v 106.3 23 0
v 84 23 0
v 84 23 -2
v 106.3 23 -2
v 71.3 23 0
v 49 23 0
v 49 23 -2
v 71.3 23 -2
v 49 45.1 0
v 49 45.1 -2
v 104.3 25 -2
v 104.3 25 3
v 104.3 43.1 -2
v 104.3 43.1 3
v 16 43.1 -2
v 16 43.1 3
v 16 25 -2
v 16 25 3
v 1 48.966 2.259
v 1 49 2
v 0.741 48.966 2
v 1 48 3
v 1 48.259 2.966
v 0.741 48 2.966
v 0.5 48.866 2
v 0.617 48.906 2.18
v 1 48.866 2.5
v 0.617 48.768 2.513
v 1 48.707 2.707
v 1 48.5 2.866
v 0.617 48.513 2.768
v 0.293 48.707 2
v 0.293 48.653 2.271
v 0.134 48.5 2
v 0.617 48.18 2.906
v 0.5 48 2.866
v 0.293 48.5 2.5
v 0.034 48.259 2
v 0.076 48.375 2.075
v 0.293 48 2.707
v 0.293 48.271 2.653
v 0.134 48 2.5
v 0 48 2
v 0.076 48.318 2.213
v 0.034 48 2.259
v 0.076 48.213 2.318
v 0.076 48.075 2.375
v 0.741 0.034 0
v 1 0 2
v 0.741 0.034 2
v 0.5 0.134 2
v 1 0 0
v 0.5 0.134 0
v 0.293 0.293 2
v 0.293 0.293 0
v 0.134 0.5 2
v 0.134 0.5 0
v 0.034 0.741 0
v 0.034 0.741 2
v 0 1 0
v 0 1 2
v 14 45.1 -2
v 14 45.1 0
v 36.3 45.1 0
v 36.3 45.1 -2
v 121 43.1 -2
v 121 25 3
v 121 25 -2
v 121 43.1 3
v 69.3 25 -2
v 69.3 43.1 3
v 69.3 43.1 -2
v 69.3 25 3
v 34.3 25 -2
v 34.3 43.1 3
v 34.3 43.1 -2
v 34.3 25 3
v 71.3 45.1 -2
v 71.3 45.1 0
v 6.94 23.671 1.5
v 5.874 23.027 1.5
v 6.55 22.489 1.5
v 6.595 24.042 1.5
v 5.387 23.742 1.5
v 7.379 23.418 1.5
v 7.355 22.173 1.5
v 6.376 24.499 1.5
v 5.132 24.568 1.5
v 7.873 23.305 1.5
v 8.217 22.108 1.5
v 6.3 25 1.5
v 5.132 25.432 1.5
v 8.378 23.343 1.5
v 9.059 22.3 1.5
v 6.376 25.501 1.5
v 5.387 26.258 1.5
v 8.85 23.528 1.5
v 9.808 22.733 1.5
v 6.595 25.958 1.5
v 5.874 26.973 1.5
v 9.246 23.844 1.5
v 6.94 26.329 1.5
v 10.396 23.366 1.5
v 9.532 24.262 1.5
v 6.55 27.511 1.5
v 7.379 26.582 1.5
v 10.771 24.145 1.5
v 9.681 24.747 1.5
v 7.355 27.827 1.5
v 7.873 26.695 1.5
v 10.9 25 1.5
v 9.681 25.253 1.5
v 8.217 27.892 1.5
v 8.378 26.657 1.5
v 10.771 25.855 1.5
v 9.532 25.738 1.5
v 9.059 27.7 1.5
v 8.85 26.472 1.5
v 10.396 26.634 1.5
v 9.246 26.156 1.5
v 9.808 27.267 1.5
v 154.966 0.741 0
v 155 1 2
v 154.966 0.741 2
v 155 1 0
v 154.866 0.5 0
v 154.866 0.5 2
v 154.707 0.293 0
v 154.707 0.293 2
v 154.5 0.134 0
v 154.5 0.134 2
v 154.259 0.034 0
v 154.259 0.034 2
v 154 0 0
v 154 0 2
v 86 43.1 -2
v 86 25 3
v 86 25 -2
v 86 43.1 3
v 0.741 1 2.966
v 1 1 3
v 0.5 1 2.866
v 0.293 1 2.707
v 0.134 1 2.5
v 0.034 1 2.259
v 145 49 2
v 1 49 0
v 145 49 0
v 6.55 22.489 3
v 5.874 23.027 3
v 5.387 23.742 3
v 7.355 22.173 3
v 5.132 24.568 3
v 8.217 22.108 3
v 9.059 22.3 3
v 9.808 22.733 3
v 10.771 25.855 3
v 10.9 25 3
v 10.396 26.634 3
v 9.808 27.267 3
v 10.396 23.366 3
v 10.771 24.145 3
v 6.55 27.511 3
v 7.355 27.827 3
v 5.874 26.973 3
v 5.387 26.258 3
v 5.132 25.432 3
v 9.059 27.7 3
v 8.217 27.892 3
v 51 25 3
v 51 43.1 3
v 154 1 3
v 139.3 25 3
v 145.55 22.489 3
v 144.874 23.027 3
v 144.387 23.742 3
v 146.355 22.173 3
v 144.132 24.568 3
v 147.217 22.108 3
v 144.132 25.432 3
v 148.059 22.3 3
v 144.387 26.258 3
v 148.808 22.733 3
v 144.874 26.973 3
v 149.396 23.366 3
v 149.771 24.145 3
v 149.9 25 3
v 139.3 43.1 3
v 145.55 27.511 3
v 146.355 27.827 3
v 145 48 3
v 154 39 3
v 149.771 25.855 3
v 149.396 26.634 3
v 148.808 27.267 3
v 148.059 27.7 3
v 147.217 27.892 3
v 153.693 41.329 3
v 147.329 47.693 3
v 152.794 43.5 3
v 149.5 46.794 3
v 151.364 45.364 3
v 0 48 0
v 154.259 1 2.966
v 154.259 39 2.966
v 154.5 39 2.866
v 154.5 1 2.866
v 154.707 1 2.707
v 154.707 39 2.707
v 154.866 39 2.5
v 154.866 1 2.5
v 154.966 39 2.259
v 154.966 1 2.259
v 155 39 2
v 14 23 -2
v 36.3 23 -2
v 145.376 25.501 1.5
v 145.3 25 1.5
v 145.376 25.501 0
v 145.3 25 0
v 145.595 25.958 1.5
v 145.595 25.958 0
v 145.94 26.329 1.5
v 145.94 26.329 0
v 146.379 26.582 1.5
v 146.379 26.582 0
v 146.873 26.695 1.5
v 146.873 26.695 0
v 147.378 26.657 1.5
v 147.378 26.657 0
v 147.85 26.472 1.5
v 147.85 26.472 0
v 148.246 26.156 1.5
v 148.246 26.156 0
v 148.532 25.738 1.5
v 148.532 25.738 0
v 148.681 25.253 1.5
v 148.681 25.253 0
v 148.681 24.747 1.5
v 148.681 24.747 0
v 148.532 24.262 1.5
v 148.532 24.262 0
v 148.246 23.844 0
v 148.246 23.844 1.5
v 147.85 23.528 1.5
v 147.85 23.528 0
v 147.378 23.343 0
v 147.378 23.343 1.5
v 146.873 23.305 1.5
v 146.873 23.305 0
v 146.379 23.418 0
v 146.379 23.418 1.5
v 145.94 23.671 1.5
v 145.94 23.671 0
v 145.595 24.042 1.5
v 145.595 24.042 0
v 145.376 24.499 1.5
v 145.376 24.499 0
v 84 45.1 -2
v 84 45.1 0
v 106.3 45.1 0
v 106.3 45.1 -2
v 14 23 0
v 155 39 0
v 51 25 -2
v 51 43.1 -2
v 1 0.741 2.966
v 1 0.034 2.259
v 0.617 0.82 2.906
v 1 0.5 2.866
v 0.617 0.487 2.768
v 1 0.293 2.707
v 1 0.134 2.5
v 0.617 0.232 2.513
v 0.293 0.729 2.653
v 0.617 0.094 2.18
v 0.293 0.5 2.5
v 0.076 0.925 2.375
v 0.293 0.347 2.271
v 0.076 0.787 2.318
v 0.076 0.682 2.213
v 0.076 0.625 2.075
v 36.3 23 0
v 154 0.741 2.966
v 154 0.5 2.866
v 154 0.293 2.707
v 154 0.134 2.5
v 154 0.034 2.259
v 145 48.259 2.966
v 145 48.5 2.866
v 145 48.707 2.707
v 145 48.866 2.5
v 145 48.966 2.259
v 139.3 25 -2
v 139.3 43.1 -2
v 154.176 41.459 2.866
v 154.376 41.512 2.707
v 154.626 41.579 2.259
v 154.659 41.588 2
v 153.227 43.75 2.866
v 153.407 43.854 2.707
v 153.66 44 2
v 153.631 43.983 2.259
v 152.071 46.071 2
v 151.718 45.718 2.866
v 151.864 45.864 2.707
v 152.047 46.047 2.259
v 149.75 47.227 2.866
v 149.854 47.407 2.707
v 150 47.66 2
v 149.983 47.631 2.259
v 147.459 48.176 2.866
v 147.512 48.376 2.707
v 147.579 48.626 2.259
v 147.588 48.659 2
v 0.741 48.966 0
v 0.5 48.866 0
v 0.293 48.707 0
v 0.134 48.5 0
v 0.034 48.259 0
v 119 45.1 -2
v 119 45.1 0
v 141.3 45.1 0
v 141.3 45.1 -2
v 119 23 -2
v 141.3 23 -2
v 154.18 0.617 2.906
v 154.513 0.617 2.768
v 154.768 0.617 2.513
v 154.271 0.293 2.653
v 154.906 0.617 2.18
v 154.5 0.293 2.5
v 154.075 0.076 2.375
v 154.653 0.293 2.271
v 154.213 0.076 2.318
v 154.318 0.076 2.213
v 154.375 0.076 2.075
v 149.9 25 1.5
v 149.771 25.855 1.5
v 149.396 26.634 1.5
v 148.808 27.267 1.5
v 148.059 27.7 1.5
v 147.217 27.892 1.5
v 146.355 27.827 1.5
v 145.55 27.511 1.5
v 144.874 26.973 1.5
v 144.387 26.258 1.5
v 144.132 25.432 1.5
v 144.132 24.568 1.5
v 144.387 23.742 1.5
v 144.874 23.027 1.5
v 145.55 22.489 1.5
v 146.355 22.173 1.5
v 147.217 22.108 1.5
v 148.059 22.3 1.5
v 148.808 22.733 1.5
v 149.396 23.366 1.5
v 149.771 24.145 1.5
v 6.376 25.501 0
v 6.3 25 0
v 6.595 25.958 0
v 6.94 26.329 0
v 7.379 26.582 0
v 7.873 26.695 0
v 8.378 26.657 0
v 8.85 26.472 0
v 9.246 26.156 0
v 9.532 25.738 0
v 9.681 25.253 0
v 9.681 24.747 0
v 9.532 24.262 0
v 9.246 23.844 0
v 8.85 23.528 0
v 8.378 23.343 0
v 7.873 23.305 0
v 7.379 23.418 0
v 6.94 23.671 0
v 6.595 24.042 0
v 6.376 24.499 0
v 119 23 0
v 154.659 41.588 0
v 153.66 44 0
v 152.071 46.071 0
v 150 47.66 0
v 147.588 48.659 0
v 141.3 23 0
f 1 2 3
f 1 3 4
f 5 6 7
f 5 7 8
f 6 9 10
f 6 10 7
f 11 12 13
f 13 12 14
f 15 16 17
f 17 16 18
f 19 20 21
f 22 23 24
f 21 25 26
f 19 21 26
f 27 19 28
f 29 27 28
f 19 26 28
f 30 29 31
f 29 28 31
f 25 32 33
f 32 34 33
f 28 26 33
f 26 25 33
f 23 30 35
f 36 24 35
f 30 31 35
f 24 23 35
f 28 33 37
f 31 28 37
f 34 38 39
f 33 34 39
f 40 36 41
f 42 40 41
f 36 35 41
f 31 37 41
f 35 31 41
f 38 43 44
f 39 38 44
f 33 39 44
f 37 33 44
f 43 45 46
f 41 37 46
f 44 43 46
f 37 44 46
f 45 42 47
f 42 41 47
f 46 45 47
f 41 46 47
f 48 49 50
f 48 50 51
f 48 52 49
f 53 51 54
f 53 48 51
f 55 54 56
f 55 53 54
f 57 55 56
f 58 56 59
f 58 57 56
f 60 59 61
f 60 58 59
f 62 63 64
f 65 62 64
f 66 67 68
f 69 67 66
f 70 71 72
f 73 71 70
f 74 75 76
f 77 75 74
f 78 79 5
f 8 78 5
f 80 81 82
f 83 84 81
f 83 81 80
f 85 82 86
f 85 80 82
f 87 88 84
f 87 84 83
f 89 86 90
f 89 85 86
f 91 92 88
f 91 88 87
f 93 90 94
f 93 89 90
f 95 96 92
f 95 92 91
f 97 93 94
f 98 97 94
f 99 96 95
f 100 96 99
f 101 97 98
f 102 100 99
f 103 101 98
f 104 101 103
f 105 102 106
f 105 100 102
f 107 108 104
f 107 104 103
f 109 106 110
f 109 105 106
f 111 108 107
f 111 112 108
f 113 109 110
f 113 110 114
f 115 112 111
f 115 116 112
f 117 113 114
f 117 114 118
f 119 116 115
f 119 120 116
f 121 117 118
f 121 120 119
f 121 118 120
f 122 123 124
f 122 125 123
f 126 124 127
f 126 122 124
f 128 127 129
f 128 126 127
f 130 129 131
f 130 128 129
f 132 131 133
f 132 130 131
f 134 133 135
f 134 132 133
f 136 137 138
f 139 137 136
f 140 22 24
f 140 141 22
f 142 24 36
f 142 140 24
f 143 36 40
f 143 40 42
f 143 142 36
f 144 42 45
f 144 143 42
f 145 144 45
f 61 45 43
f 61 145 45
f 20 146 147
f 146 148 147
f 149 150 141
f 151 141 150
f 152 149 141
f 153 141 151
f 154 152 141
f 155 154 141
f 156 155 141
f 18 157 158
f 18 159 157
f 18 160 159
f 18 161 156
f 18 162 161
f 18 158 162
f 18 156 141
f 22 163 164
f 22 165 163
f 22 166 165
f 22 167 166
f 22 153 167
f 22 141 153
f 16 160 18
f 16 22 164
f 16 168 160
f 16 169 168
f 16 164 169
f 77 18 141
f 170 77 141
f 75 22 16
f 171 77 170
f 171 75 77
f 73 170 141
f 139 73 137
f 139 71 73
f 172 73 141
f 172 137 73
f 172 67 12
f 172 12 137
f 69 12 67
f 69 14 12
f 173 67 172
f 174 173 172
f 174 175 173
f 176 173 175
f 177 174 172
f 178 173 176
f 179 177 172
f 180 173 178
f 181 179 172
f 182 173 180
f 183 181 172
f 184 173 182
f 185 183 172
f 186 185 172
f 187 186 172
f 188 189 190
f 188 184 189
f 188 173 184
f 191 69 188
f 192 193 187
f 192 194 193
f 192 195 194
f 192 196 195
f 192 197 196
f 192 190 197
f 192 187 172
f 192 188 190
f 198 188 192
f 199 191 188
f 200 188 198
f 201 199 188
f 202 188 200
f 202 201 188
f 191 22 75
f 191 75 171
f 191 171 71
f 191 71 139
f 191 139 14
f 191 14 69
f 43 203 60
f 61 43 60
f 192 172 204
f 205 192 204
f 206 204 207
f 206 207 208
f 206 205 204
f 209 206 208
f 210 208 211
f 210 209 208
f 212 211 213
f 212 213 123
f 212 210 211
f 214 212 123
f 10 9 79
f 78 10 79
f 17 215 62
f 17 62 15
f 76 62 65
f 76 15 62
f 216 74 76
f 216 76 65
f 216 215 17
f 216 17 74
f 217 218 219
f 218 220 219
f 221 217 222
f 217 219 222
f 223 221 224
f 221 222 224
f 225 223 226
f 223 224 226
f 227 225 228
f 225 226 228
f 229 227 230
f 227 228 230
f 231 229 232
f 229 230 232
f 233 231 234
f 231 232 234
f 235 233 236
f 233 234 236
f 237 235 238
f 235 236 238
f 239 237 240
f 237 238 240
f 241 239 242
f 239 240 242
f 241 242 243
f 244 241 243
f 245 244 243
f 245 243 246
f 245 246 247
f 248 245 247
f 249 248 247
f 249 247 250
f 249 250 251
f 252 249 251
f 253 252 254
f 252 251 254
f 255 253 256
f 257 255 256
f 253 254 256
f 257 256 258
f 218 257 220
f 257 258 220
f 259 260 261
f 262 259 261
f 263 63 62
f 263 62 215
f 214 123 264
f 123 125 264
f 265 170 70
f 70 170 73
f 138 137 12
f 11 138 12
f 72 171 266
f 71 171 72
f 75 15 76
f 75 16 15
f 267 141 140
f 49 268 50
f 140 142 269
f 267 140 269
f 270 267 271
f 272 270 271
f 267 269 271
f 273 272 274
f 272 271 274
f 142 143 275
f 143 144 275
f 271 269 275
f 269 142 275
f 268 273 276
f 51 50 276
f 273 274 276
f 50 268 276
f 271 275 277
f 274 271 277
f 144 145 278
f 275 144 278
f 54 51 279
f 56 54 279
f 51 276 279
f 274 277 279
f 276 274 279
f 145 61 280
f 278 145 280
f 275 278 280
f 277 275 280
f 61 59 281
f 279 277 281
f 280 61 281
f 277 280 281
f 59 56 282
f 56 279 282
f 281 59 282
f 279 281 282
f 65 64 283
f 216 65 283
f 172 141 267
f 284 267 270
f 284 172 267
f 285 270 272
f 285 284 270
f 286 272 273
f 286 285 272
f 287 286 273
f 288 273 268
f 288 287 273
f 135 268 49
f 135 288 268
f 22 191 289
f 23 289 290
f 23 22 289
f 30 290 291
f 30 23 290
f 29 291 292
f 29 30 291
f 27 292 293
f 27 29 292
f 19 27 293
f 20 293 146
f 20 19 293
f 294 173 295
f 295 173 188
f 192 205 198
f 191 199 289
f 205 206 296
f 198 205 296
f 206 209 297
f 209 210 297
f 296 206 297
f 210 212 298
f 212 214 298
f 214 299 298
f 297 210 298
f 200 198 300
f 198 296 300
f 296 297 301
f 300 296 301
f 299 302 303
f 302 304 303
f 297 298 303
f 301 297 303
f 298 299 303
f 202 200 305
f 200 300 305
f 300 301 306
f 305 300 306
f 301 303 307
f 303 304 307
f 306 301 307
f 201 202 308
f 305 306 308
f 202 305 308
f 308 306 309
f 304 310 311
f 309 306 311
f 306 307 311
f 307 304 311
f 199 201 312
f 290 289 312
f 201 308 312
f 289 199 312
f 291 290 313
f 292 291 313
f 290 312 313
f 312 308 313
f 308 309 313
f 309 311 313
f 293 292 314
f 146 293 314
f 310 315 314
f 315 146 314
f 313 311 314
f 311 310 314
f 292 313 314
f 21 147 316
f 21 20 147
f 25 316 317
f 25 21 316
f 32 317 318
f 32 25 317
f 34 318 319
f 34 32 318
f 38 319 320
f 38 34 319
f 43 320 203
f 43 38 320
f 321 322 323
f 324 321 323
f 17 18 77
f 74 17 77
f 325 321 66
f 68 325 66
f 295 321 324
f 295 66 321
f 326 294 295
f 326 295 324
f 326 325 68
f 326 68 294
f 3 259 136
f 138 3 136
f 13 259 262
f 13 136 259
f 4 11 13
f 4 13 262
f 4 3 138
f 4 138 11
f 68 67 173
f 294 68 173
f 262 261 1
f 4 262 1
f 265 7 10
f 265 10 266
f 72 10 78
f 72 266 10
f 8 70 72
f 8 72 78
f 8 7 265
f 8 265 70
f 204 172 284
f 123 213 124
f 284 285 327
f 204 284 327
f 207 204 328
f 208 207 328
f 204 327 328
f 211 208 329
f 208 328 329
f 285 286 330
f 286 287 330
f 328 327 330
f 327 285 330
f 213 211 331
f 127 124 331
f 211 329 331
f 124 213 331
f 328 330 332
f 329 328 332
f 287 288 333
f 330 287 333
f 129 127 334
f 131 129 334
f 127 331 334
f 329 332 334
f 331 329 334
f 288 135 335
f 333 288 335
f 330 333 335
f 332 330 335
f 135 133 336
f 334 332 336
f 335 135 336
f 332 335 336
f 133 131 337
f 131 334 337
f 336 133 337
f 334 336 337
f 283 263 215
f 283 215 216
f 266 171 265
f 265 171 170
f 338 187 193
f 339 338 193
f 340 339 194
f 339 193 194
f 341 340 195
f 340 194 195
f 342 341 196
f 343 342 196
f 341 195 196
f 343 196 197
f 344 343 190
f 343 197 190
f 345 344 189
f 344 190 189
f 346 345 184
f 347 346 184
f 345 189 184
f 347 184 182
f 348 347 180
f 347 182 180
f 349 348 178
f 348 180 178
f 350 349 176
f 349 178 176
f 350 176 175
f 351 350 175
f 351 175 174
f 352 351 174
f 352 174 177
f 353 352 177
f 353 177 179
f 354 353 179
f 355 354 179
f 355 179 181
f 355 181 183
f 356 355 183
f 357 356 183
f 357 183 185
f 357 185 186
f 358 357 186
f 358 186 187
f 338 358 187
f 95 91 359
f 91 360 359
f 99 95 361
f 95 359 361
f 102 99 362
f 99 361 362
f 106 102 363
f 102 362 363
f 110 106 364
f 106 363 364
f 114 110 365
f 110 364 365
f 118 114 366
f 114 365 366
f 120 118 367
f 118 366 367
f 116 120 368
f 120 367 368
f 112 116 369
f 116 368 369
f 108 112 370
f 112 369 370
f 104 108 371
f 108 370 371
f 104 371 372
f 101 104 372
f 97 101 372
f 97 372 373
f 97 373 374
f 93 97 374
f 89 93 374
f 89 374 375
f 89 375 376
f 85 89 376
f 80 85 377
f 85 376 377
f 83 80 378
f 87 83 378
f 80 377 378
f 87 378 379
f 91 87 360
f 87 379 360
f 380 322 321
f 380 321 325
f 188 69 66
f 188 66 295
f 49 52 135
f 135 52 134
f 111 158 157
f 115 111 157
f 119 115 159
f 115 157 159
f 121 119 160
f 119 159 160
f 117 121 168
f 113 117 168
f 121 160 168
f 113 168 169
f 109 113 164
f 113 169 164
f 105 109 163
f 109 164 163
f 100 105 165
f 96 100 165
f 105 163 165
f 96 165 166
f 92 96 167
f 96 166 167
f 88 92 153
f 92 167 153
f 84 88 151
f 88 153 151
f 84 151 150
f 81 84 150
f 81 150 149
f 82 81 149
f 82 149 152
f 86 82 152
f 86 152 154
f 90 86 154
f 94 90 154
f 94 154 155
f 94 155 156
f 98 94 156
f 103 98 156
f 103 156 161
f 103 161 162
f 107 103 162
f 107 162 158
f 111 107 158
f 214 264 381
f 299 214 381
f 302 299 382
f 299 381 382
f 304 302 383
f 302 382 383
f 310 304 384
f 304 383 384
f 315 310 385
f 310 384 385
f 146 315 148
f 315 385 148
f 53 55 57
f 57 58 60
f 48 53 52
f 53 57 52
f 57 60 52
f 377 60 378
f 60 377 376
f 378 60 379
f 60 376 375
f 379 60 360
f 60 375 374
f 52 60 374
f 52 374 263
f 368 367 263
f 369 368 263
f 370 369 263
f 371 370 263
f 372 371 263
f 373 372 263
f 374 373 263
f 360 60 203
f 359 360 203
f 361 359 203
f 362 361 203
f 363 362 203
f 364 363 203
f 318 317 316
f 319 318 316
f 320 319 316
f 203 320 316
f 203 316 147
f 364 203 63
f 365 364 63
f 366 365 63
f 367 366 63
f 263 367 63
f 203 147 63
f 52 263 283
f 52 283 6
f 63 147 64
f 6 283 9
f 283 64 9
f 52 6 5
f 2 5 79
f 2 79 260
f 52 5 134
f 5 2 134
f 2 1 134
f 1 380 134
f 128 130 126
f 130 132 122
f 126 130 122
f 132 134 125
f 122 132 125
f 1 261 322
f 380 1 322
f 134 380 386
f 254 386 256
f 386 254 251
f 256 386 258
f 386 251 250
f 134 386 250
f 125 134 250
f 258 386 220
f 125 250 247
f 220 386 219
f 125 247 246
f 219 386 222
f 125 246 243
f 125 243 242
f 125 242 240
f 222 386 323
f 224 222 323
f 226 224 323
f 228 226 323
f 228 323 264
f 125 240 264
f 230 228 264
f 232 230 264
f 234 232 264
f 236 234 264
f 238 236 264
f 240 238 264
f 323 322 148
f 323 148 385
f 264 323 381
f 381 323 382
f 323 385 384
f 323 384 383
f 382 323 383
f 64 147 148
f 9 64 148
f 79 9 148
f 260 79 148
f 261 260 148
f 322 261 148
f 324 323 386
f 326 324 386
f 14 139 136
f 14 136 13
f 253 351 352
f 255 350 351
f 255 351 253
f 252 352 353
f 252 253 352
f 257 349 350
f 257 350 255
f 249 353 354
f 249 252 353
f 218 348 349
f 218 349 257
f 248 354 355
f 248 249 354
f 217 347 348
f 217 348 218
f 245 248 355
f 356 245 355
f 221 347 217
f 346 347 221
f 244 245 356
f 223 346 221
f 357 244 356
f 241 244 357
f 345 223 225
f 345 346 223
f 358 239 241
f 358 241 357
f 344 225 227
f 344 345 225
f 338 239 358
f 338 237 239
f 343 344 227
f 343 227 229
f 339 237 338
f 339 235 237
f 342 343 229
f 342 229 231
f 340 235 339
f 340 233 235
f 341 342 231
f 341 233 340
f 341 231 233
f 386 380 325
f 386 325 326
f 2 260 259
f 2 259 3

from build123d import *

# Parameters (mm, degrees)
PAD_DEPTH              = 3
SKETCH001_W            = 18.3
SKETCH001_H            = 18.1
POCKET_DEPTH           = 3.001
LINEARPATTERN_COUNT    = 4
LINEARPATTERN_PITCH    = 35
HOLE_D                 = 3.4
HOLE_CBORE_D           = 5.8
HOLE_CBORE_DEPTH       = 1.5
SKETCH004_W            = 22.3
SKETCH004_H            = 22.1
SKETCH004_W_2          = 18.3
SKETCH004_H_2          = 18.1
PAD001_DEPTH           = 2
LINEARPATTERN001_COUNT = 4
LINEARPATTERN001_PITCH = 35
FILLET_R               = 1
FILLET001_R            = 1
FILLET002_R            = 1


with BuildPart() as part:
    # Sketch → Pad (new body)
    with BuildSketch(Plane.XY):
        with BuildLine():
            Line((145, 49), (0, 49))
            Line((0, 49), (0, 0))
            Line((0, 0), (155, 0))
            Line((155, 0), (155, 39))
            ThreePointArc((155, 39), (152.071068, 46.071068), (145, 49))
        make_face()
    extrude(amount=PAD_DEPTH)

    # Sketch001 (on Face7 of Pad) → Pocket (cut, through all)
    with BuildSketch(Plane.XY.offset(3)):
        with Locations((25.15, 34.05)):
            Rectangle(SKETCH001_W, SKETCH001_H)
    pocket = extrude(amount=-POCKET_DEPTH, mode=Mode.SUBTRACT)

    # LinearPattern: Pocket ×4
    with Locations(*[(i * LINEARPATTERN_PITCH, 0, 0) for i in range(1, LINEARPATTERN_COUNT)]):
        add(pocket, mode=Mode.SUBTRACT)

    # Hole (through all)
    with Locations(Plane.XY.offset(3)):
        with Locations((8, 25), (147, 25)):
            CounterBoreHole(HOLE_D / 2, HOLE_CBORE_D / 2, HOLE_CBORE_DEPTH)

    # Sketch004 (on Face4 of Hole) → Pad001 (join)
    with BuildSketch(Plane(origin=(0, 0, 0), x_dir=(1, 0, 0), z_dir=(0, 0, -1))):
        with Locations((25.15, -34.05)):
            Rectangle(SKETCH004_W, SKETCH004_H)
        with Locations((25.15, -34.05)):
            Rectangle(SKETCH004_W_2, SKETCH004_H_2, mode=Mode.SUBTRACT)
    pad001 = extrude(amount=PAD001_DEPTH)

    # LinearPattern001: Pad001 ×4
    with Locations(*[(i * LINEARPATTERN001_PITCH, 0, 0) for i in range(1, LINEARPATTERN001_COUNT)]):
        add(pad001)

    # Fillet
    fillet_edges = [part.edges().sort_by_distance(p)[0] for p in [
        (72.5, 49, 3),
    ]]
    fillet(fillet_edges, radius=FILLET_R)

    # Fillet001
    fillet001_edges = [part.edges().sort_by_distance(p)[0] for p in [
        (77, 0, 3),
    ]]
    fillet(fillet001_edges, radius=FILLET001_R)

    # Fillet002
    fillet002_edges = [part.edges().sort_by_distance(p)[0] for p in [
        (0, 24.5, 3),
    ]]
    fillet(fillet002_edges, radius=FILLET002_R)


solid = part.part
